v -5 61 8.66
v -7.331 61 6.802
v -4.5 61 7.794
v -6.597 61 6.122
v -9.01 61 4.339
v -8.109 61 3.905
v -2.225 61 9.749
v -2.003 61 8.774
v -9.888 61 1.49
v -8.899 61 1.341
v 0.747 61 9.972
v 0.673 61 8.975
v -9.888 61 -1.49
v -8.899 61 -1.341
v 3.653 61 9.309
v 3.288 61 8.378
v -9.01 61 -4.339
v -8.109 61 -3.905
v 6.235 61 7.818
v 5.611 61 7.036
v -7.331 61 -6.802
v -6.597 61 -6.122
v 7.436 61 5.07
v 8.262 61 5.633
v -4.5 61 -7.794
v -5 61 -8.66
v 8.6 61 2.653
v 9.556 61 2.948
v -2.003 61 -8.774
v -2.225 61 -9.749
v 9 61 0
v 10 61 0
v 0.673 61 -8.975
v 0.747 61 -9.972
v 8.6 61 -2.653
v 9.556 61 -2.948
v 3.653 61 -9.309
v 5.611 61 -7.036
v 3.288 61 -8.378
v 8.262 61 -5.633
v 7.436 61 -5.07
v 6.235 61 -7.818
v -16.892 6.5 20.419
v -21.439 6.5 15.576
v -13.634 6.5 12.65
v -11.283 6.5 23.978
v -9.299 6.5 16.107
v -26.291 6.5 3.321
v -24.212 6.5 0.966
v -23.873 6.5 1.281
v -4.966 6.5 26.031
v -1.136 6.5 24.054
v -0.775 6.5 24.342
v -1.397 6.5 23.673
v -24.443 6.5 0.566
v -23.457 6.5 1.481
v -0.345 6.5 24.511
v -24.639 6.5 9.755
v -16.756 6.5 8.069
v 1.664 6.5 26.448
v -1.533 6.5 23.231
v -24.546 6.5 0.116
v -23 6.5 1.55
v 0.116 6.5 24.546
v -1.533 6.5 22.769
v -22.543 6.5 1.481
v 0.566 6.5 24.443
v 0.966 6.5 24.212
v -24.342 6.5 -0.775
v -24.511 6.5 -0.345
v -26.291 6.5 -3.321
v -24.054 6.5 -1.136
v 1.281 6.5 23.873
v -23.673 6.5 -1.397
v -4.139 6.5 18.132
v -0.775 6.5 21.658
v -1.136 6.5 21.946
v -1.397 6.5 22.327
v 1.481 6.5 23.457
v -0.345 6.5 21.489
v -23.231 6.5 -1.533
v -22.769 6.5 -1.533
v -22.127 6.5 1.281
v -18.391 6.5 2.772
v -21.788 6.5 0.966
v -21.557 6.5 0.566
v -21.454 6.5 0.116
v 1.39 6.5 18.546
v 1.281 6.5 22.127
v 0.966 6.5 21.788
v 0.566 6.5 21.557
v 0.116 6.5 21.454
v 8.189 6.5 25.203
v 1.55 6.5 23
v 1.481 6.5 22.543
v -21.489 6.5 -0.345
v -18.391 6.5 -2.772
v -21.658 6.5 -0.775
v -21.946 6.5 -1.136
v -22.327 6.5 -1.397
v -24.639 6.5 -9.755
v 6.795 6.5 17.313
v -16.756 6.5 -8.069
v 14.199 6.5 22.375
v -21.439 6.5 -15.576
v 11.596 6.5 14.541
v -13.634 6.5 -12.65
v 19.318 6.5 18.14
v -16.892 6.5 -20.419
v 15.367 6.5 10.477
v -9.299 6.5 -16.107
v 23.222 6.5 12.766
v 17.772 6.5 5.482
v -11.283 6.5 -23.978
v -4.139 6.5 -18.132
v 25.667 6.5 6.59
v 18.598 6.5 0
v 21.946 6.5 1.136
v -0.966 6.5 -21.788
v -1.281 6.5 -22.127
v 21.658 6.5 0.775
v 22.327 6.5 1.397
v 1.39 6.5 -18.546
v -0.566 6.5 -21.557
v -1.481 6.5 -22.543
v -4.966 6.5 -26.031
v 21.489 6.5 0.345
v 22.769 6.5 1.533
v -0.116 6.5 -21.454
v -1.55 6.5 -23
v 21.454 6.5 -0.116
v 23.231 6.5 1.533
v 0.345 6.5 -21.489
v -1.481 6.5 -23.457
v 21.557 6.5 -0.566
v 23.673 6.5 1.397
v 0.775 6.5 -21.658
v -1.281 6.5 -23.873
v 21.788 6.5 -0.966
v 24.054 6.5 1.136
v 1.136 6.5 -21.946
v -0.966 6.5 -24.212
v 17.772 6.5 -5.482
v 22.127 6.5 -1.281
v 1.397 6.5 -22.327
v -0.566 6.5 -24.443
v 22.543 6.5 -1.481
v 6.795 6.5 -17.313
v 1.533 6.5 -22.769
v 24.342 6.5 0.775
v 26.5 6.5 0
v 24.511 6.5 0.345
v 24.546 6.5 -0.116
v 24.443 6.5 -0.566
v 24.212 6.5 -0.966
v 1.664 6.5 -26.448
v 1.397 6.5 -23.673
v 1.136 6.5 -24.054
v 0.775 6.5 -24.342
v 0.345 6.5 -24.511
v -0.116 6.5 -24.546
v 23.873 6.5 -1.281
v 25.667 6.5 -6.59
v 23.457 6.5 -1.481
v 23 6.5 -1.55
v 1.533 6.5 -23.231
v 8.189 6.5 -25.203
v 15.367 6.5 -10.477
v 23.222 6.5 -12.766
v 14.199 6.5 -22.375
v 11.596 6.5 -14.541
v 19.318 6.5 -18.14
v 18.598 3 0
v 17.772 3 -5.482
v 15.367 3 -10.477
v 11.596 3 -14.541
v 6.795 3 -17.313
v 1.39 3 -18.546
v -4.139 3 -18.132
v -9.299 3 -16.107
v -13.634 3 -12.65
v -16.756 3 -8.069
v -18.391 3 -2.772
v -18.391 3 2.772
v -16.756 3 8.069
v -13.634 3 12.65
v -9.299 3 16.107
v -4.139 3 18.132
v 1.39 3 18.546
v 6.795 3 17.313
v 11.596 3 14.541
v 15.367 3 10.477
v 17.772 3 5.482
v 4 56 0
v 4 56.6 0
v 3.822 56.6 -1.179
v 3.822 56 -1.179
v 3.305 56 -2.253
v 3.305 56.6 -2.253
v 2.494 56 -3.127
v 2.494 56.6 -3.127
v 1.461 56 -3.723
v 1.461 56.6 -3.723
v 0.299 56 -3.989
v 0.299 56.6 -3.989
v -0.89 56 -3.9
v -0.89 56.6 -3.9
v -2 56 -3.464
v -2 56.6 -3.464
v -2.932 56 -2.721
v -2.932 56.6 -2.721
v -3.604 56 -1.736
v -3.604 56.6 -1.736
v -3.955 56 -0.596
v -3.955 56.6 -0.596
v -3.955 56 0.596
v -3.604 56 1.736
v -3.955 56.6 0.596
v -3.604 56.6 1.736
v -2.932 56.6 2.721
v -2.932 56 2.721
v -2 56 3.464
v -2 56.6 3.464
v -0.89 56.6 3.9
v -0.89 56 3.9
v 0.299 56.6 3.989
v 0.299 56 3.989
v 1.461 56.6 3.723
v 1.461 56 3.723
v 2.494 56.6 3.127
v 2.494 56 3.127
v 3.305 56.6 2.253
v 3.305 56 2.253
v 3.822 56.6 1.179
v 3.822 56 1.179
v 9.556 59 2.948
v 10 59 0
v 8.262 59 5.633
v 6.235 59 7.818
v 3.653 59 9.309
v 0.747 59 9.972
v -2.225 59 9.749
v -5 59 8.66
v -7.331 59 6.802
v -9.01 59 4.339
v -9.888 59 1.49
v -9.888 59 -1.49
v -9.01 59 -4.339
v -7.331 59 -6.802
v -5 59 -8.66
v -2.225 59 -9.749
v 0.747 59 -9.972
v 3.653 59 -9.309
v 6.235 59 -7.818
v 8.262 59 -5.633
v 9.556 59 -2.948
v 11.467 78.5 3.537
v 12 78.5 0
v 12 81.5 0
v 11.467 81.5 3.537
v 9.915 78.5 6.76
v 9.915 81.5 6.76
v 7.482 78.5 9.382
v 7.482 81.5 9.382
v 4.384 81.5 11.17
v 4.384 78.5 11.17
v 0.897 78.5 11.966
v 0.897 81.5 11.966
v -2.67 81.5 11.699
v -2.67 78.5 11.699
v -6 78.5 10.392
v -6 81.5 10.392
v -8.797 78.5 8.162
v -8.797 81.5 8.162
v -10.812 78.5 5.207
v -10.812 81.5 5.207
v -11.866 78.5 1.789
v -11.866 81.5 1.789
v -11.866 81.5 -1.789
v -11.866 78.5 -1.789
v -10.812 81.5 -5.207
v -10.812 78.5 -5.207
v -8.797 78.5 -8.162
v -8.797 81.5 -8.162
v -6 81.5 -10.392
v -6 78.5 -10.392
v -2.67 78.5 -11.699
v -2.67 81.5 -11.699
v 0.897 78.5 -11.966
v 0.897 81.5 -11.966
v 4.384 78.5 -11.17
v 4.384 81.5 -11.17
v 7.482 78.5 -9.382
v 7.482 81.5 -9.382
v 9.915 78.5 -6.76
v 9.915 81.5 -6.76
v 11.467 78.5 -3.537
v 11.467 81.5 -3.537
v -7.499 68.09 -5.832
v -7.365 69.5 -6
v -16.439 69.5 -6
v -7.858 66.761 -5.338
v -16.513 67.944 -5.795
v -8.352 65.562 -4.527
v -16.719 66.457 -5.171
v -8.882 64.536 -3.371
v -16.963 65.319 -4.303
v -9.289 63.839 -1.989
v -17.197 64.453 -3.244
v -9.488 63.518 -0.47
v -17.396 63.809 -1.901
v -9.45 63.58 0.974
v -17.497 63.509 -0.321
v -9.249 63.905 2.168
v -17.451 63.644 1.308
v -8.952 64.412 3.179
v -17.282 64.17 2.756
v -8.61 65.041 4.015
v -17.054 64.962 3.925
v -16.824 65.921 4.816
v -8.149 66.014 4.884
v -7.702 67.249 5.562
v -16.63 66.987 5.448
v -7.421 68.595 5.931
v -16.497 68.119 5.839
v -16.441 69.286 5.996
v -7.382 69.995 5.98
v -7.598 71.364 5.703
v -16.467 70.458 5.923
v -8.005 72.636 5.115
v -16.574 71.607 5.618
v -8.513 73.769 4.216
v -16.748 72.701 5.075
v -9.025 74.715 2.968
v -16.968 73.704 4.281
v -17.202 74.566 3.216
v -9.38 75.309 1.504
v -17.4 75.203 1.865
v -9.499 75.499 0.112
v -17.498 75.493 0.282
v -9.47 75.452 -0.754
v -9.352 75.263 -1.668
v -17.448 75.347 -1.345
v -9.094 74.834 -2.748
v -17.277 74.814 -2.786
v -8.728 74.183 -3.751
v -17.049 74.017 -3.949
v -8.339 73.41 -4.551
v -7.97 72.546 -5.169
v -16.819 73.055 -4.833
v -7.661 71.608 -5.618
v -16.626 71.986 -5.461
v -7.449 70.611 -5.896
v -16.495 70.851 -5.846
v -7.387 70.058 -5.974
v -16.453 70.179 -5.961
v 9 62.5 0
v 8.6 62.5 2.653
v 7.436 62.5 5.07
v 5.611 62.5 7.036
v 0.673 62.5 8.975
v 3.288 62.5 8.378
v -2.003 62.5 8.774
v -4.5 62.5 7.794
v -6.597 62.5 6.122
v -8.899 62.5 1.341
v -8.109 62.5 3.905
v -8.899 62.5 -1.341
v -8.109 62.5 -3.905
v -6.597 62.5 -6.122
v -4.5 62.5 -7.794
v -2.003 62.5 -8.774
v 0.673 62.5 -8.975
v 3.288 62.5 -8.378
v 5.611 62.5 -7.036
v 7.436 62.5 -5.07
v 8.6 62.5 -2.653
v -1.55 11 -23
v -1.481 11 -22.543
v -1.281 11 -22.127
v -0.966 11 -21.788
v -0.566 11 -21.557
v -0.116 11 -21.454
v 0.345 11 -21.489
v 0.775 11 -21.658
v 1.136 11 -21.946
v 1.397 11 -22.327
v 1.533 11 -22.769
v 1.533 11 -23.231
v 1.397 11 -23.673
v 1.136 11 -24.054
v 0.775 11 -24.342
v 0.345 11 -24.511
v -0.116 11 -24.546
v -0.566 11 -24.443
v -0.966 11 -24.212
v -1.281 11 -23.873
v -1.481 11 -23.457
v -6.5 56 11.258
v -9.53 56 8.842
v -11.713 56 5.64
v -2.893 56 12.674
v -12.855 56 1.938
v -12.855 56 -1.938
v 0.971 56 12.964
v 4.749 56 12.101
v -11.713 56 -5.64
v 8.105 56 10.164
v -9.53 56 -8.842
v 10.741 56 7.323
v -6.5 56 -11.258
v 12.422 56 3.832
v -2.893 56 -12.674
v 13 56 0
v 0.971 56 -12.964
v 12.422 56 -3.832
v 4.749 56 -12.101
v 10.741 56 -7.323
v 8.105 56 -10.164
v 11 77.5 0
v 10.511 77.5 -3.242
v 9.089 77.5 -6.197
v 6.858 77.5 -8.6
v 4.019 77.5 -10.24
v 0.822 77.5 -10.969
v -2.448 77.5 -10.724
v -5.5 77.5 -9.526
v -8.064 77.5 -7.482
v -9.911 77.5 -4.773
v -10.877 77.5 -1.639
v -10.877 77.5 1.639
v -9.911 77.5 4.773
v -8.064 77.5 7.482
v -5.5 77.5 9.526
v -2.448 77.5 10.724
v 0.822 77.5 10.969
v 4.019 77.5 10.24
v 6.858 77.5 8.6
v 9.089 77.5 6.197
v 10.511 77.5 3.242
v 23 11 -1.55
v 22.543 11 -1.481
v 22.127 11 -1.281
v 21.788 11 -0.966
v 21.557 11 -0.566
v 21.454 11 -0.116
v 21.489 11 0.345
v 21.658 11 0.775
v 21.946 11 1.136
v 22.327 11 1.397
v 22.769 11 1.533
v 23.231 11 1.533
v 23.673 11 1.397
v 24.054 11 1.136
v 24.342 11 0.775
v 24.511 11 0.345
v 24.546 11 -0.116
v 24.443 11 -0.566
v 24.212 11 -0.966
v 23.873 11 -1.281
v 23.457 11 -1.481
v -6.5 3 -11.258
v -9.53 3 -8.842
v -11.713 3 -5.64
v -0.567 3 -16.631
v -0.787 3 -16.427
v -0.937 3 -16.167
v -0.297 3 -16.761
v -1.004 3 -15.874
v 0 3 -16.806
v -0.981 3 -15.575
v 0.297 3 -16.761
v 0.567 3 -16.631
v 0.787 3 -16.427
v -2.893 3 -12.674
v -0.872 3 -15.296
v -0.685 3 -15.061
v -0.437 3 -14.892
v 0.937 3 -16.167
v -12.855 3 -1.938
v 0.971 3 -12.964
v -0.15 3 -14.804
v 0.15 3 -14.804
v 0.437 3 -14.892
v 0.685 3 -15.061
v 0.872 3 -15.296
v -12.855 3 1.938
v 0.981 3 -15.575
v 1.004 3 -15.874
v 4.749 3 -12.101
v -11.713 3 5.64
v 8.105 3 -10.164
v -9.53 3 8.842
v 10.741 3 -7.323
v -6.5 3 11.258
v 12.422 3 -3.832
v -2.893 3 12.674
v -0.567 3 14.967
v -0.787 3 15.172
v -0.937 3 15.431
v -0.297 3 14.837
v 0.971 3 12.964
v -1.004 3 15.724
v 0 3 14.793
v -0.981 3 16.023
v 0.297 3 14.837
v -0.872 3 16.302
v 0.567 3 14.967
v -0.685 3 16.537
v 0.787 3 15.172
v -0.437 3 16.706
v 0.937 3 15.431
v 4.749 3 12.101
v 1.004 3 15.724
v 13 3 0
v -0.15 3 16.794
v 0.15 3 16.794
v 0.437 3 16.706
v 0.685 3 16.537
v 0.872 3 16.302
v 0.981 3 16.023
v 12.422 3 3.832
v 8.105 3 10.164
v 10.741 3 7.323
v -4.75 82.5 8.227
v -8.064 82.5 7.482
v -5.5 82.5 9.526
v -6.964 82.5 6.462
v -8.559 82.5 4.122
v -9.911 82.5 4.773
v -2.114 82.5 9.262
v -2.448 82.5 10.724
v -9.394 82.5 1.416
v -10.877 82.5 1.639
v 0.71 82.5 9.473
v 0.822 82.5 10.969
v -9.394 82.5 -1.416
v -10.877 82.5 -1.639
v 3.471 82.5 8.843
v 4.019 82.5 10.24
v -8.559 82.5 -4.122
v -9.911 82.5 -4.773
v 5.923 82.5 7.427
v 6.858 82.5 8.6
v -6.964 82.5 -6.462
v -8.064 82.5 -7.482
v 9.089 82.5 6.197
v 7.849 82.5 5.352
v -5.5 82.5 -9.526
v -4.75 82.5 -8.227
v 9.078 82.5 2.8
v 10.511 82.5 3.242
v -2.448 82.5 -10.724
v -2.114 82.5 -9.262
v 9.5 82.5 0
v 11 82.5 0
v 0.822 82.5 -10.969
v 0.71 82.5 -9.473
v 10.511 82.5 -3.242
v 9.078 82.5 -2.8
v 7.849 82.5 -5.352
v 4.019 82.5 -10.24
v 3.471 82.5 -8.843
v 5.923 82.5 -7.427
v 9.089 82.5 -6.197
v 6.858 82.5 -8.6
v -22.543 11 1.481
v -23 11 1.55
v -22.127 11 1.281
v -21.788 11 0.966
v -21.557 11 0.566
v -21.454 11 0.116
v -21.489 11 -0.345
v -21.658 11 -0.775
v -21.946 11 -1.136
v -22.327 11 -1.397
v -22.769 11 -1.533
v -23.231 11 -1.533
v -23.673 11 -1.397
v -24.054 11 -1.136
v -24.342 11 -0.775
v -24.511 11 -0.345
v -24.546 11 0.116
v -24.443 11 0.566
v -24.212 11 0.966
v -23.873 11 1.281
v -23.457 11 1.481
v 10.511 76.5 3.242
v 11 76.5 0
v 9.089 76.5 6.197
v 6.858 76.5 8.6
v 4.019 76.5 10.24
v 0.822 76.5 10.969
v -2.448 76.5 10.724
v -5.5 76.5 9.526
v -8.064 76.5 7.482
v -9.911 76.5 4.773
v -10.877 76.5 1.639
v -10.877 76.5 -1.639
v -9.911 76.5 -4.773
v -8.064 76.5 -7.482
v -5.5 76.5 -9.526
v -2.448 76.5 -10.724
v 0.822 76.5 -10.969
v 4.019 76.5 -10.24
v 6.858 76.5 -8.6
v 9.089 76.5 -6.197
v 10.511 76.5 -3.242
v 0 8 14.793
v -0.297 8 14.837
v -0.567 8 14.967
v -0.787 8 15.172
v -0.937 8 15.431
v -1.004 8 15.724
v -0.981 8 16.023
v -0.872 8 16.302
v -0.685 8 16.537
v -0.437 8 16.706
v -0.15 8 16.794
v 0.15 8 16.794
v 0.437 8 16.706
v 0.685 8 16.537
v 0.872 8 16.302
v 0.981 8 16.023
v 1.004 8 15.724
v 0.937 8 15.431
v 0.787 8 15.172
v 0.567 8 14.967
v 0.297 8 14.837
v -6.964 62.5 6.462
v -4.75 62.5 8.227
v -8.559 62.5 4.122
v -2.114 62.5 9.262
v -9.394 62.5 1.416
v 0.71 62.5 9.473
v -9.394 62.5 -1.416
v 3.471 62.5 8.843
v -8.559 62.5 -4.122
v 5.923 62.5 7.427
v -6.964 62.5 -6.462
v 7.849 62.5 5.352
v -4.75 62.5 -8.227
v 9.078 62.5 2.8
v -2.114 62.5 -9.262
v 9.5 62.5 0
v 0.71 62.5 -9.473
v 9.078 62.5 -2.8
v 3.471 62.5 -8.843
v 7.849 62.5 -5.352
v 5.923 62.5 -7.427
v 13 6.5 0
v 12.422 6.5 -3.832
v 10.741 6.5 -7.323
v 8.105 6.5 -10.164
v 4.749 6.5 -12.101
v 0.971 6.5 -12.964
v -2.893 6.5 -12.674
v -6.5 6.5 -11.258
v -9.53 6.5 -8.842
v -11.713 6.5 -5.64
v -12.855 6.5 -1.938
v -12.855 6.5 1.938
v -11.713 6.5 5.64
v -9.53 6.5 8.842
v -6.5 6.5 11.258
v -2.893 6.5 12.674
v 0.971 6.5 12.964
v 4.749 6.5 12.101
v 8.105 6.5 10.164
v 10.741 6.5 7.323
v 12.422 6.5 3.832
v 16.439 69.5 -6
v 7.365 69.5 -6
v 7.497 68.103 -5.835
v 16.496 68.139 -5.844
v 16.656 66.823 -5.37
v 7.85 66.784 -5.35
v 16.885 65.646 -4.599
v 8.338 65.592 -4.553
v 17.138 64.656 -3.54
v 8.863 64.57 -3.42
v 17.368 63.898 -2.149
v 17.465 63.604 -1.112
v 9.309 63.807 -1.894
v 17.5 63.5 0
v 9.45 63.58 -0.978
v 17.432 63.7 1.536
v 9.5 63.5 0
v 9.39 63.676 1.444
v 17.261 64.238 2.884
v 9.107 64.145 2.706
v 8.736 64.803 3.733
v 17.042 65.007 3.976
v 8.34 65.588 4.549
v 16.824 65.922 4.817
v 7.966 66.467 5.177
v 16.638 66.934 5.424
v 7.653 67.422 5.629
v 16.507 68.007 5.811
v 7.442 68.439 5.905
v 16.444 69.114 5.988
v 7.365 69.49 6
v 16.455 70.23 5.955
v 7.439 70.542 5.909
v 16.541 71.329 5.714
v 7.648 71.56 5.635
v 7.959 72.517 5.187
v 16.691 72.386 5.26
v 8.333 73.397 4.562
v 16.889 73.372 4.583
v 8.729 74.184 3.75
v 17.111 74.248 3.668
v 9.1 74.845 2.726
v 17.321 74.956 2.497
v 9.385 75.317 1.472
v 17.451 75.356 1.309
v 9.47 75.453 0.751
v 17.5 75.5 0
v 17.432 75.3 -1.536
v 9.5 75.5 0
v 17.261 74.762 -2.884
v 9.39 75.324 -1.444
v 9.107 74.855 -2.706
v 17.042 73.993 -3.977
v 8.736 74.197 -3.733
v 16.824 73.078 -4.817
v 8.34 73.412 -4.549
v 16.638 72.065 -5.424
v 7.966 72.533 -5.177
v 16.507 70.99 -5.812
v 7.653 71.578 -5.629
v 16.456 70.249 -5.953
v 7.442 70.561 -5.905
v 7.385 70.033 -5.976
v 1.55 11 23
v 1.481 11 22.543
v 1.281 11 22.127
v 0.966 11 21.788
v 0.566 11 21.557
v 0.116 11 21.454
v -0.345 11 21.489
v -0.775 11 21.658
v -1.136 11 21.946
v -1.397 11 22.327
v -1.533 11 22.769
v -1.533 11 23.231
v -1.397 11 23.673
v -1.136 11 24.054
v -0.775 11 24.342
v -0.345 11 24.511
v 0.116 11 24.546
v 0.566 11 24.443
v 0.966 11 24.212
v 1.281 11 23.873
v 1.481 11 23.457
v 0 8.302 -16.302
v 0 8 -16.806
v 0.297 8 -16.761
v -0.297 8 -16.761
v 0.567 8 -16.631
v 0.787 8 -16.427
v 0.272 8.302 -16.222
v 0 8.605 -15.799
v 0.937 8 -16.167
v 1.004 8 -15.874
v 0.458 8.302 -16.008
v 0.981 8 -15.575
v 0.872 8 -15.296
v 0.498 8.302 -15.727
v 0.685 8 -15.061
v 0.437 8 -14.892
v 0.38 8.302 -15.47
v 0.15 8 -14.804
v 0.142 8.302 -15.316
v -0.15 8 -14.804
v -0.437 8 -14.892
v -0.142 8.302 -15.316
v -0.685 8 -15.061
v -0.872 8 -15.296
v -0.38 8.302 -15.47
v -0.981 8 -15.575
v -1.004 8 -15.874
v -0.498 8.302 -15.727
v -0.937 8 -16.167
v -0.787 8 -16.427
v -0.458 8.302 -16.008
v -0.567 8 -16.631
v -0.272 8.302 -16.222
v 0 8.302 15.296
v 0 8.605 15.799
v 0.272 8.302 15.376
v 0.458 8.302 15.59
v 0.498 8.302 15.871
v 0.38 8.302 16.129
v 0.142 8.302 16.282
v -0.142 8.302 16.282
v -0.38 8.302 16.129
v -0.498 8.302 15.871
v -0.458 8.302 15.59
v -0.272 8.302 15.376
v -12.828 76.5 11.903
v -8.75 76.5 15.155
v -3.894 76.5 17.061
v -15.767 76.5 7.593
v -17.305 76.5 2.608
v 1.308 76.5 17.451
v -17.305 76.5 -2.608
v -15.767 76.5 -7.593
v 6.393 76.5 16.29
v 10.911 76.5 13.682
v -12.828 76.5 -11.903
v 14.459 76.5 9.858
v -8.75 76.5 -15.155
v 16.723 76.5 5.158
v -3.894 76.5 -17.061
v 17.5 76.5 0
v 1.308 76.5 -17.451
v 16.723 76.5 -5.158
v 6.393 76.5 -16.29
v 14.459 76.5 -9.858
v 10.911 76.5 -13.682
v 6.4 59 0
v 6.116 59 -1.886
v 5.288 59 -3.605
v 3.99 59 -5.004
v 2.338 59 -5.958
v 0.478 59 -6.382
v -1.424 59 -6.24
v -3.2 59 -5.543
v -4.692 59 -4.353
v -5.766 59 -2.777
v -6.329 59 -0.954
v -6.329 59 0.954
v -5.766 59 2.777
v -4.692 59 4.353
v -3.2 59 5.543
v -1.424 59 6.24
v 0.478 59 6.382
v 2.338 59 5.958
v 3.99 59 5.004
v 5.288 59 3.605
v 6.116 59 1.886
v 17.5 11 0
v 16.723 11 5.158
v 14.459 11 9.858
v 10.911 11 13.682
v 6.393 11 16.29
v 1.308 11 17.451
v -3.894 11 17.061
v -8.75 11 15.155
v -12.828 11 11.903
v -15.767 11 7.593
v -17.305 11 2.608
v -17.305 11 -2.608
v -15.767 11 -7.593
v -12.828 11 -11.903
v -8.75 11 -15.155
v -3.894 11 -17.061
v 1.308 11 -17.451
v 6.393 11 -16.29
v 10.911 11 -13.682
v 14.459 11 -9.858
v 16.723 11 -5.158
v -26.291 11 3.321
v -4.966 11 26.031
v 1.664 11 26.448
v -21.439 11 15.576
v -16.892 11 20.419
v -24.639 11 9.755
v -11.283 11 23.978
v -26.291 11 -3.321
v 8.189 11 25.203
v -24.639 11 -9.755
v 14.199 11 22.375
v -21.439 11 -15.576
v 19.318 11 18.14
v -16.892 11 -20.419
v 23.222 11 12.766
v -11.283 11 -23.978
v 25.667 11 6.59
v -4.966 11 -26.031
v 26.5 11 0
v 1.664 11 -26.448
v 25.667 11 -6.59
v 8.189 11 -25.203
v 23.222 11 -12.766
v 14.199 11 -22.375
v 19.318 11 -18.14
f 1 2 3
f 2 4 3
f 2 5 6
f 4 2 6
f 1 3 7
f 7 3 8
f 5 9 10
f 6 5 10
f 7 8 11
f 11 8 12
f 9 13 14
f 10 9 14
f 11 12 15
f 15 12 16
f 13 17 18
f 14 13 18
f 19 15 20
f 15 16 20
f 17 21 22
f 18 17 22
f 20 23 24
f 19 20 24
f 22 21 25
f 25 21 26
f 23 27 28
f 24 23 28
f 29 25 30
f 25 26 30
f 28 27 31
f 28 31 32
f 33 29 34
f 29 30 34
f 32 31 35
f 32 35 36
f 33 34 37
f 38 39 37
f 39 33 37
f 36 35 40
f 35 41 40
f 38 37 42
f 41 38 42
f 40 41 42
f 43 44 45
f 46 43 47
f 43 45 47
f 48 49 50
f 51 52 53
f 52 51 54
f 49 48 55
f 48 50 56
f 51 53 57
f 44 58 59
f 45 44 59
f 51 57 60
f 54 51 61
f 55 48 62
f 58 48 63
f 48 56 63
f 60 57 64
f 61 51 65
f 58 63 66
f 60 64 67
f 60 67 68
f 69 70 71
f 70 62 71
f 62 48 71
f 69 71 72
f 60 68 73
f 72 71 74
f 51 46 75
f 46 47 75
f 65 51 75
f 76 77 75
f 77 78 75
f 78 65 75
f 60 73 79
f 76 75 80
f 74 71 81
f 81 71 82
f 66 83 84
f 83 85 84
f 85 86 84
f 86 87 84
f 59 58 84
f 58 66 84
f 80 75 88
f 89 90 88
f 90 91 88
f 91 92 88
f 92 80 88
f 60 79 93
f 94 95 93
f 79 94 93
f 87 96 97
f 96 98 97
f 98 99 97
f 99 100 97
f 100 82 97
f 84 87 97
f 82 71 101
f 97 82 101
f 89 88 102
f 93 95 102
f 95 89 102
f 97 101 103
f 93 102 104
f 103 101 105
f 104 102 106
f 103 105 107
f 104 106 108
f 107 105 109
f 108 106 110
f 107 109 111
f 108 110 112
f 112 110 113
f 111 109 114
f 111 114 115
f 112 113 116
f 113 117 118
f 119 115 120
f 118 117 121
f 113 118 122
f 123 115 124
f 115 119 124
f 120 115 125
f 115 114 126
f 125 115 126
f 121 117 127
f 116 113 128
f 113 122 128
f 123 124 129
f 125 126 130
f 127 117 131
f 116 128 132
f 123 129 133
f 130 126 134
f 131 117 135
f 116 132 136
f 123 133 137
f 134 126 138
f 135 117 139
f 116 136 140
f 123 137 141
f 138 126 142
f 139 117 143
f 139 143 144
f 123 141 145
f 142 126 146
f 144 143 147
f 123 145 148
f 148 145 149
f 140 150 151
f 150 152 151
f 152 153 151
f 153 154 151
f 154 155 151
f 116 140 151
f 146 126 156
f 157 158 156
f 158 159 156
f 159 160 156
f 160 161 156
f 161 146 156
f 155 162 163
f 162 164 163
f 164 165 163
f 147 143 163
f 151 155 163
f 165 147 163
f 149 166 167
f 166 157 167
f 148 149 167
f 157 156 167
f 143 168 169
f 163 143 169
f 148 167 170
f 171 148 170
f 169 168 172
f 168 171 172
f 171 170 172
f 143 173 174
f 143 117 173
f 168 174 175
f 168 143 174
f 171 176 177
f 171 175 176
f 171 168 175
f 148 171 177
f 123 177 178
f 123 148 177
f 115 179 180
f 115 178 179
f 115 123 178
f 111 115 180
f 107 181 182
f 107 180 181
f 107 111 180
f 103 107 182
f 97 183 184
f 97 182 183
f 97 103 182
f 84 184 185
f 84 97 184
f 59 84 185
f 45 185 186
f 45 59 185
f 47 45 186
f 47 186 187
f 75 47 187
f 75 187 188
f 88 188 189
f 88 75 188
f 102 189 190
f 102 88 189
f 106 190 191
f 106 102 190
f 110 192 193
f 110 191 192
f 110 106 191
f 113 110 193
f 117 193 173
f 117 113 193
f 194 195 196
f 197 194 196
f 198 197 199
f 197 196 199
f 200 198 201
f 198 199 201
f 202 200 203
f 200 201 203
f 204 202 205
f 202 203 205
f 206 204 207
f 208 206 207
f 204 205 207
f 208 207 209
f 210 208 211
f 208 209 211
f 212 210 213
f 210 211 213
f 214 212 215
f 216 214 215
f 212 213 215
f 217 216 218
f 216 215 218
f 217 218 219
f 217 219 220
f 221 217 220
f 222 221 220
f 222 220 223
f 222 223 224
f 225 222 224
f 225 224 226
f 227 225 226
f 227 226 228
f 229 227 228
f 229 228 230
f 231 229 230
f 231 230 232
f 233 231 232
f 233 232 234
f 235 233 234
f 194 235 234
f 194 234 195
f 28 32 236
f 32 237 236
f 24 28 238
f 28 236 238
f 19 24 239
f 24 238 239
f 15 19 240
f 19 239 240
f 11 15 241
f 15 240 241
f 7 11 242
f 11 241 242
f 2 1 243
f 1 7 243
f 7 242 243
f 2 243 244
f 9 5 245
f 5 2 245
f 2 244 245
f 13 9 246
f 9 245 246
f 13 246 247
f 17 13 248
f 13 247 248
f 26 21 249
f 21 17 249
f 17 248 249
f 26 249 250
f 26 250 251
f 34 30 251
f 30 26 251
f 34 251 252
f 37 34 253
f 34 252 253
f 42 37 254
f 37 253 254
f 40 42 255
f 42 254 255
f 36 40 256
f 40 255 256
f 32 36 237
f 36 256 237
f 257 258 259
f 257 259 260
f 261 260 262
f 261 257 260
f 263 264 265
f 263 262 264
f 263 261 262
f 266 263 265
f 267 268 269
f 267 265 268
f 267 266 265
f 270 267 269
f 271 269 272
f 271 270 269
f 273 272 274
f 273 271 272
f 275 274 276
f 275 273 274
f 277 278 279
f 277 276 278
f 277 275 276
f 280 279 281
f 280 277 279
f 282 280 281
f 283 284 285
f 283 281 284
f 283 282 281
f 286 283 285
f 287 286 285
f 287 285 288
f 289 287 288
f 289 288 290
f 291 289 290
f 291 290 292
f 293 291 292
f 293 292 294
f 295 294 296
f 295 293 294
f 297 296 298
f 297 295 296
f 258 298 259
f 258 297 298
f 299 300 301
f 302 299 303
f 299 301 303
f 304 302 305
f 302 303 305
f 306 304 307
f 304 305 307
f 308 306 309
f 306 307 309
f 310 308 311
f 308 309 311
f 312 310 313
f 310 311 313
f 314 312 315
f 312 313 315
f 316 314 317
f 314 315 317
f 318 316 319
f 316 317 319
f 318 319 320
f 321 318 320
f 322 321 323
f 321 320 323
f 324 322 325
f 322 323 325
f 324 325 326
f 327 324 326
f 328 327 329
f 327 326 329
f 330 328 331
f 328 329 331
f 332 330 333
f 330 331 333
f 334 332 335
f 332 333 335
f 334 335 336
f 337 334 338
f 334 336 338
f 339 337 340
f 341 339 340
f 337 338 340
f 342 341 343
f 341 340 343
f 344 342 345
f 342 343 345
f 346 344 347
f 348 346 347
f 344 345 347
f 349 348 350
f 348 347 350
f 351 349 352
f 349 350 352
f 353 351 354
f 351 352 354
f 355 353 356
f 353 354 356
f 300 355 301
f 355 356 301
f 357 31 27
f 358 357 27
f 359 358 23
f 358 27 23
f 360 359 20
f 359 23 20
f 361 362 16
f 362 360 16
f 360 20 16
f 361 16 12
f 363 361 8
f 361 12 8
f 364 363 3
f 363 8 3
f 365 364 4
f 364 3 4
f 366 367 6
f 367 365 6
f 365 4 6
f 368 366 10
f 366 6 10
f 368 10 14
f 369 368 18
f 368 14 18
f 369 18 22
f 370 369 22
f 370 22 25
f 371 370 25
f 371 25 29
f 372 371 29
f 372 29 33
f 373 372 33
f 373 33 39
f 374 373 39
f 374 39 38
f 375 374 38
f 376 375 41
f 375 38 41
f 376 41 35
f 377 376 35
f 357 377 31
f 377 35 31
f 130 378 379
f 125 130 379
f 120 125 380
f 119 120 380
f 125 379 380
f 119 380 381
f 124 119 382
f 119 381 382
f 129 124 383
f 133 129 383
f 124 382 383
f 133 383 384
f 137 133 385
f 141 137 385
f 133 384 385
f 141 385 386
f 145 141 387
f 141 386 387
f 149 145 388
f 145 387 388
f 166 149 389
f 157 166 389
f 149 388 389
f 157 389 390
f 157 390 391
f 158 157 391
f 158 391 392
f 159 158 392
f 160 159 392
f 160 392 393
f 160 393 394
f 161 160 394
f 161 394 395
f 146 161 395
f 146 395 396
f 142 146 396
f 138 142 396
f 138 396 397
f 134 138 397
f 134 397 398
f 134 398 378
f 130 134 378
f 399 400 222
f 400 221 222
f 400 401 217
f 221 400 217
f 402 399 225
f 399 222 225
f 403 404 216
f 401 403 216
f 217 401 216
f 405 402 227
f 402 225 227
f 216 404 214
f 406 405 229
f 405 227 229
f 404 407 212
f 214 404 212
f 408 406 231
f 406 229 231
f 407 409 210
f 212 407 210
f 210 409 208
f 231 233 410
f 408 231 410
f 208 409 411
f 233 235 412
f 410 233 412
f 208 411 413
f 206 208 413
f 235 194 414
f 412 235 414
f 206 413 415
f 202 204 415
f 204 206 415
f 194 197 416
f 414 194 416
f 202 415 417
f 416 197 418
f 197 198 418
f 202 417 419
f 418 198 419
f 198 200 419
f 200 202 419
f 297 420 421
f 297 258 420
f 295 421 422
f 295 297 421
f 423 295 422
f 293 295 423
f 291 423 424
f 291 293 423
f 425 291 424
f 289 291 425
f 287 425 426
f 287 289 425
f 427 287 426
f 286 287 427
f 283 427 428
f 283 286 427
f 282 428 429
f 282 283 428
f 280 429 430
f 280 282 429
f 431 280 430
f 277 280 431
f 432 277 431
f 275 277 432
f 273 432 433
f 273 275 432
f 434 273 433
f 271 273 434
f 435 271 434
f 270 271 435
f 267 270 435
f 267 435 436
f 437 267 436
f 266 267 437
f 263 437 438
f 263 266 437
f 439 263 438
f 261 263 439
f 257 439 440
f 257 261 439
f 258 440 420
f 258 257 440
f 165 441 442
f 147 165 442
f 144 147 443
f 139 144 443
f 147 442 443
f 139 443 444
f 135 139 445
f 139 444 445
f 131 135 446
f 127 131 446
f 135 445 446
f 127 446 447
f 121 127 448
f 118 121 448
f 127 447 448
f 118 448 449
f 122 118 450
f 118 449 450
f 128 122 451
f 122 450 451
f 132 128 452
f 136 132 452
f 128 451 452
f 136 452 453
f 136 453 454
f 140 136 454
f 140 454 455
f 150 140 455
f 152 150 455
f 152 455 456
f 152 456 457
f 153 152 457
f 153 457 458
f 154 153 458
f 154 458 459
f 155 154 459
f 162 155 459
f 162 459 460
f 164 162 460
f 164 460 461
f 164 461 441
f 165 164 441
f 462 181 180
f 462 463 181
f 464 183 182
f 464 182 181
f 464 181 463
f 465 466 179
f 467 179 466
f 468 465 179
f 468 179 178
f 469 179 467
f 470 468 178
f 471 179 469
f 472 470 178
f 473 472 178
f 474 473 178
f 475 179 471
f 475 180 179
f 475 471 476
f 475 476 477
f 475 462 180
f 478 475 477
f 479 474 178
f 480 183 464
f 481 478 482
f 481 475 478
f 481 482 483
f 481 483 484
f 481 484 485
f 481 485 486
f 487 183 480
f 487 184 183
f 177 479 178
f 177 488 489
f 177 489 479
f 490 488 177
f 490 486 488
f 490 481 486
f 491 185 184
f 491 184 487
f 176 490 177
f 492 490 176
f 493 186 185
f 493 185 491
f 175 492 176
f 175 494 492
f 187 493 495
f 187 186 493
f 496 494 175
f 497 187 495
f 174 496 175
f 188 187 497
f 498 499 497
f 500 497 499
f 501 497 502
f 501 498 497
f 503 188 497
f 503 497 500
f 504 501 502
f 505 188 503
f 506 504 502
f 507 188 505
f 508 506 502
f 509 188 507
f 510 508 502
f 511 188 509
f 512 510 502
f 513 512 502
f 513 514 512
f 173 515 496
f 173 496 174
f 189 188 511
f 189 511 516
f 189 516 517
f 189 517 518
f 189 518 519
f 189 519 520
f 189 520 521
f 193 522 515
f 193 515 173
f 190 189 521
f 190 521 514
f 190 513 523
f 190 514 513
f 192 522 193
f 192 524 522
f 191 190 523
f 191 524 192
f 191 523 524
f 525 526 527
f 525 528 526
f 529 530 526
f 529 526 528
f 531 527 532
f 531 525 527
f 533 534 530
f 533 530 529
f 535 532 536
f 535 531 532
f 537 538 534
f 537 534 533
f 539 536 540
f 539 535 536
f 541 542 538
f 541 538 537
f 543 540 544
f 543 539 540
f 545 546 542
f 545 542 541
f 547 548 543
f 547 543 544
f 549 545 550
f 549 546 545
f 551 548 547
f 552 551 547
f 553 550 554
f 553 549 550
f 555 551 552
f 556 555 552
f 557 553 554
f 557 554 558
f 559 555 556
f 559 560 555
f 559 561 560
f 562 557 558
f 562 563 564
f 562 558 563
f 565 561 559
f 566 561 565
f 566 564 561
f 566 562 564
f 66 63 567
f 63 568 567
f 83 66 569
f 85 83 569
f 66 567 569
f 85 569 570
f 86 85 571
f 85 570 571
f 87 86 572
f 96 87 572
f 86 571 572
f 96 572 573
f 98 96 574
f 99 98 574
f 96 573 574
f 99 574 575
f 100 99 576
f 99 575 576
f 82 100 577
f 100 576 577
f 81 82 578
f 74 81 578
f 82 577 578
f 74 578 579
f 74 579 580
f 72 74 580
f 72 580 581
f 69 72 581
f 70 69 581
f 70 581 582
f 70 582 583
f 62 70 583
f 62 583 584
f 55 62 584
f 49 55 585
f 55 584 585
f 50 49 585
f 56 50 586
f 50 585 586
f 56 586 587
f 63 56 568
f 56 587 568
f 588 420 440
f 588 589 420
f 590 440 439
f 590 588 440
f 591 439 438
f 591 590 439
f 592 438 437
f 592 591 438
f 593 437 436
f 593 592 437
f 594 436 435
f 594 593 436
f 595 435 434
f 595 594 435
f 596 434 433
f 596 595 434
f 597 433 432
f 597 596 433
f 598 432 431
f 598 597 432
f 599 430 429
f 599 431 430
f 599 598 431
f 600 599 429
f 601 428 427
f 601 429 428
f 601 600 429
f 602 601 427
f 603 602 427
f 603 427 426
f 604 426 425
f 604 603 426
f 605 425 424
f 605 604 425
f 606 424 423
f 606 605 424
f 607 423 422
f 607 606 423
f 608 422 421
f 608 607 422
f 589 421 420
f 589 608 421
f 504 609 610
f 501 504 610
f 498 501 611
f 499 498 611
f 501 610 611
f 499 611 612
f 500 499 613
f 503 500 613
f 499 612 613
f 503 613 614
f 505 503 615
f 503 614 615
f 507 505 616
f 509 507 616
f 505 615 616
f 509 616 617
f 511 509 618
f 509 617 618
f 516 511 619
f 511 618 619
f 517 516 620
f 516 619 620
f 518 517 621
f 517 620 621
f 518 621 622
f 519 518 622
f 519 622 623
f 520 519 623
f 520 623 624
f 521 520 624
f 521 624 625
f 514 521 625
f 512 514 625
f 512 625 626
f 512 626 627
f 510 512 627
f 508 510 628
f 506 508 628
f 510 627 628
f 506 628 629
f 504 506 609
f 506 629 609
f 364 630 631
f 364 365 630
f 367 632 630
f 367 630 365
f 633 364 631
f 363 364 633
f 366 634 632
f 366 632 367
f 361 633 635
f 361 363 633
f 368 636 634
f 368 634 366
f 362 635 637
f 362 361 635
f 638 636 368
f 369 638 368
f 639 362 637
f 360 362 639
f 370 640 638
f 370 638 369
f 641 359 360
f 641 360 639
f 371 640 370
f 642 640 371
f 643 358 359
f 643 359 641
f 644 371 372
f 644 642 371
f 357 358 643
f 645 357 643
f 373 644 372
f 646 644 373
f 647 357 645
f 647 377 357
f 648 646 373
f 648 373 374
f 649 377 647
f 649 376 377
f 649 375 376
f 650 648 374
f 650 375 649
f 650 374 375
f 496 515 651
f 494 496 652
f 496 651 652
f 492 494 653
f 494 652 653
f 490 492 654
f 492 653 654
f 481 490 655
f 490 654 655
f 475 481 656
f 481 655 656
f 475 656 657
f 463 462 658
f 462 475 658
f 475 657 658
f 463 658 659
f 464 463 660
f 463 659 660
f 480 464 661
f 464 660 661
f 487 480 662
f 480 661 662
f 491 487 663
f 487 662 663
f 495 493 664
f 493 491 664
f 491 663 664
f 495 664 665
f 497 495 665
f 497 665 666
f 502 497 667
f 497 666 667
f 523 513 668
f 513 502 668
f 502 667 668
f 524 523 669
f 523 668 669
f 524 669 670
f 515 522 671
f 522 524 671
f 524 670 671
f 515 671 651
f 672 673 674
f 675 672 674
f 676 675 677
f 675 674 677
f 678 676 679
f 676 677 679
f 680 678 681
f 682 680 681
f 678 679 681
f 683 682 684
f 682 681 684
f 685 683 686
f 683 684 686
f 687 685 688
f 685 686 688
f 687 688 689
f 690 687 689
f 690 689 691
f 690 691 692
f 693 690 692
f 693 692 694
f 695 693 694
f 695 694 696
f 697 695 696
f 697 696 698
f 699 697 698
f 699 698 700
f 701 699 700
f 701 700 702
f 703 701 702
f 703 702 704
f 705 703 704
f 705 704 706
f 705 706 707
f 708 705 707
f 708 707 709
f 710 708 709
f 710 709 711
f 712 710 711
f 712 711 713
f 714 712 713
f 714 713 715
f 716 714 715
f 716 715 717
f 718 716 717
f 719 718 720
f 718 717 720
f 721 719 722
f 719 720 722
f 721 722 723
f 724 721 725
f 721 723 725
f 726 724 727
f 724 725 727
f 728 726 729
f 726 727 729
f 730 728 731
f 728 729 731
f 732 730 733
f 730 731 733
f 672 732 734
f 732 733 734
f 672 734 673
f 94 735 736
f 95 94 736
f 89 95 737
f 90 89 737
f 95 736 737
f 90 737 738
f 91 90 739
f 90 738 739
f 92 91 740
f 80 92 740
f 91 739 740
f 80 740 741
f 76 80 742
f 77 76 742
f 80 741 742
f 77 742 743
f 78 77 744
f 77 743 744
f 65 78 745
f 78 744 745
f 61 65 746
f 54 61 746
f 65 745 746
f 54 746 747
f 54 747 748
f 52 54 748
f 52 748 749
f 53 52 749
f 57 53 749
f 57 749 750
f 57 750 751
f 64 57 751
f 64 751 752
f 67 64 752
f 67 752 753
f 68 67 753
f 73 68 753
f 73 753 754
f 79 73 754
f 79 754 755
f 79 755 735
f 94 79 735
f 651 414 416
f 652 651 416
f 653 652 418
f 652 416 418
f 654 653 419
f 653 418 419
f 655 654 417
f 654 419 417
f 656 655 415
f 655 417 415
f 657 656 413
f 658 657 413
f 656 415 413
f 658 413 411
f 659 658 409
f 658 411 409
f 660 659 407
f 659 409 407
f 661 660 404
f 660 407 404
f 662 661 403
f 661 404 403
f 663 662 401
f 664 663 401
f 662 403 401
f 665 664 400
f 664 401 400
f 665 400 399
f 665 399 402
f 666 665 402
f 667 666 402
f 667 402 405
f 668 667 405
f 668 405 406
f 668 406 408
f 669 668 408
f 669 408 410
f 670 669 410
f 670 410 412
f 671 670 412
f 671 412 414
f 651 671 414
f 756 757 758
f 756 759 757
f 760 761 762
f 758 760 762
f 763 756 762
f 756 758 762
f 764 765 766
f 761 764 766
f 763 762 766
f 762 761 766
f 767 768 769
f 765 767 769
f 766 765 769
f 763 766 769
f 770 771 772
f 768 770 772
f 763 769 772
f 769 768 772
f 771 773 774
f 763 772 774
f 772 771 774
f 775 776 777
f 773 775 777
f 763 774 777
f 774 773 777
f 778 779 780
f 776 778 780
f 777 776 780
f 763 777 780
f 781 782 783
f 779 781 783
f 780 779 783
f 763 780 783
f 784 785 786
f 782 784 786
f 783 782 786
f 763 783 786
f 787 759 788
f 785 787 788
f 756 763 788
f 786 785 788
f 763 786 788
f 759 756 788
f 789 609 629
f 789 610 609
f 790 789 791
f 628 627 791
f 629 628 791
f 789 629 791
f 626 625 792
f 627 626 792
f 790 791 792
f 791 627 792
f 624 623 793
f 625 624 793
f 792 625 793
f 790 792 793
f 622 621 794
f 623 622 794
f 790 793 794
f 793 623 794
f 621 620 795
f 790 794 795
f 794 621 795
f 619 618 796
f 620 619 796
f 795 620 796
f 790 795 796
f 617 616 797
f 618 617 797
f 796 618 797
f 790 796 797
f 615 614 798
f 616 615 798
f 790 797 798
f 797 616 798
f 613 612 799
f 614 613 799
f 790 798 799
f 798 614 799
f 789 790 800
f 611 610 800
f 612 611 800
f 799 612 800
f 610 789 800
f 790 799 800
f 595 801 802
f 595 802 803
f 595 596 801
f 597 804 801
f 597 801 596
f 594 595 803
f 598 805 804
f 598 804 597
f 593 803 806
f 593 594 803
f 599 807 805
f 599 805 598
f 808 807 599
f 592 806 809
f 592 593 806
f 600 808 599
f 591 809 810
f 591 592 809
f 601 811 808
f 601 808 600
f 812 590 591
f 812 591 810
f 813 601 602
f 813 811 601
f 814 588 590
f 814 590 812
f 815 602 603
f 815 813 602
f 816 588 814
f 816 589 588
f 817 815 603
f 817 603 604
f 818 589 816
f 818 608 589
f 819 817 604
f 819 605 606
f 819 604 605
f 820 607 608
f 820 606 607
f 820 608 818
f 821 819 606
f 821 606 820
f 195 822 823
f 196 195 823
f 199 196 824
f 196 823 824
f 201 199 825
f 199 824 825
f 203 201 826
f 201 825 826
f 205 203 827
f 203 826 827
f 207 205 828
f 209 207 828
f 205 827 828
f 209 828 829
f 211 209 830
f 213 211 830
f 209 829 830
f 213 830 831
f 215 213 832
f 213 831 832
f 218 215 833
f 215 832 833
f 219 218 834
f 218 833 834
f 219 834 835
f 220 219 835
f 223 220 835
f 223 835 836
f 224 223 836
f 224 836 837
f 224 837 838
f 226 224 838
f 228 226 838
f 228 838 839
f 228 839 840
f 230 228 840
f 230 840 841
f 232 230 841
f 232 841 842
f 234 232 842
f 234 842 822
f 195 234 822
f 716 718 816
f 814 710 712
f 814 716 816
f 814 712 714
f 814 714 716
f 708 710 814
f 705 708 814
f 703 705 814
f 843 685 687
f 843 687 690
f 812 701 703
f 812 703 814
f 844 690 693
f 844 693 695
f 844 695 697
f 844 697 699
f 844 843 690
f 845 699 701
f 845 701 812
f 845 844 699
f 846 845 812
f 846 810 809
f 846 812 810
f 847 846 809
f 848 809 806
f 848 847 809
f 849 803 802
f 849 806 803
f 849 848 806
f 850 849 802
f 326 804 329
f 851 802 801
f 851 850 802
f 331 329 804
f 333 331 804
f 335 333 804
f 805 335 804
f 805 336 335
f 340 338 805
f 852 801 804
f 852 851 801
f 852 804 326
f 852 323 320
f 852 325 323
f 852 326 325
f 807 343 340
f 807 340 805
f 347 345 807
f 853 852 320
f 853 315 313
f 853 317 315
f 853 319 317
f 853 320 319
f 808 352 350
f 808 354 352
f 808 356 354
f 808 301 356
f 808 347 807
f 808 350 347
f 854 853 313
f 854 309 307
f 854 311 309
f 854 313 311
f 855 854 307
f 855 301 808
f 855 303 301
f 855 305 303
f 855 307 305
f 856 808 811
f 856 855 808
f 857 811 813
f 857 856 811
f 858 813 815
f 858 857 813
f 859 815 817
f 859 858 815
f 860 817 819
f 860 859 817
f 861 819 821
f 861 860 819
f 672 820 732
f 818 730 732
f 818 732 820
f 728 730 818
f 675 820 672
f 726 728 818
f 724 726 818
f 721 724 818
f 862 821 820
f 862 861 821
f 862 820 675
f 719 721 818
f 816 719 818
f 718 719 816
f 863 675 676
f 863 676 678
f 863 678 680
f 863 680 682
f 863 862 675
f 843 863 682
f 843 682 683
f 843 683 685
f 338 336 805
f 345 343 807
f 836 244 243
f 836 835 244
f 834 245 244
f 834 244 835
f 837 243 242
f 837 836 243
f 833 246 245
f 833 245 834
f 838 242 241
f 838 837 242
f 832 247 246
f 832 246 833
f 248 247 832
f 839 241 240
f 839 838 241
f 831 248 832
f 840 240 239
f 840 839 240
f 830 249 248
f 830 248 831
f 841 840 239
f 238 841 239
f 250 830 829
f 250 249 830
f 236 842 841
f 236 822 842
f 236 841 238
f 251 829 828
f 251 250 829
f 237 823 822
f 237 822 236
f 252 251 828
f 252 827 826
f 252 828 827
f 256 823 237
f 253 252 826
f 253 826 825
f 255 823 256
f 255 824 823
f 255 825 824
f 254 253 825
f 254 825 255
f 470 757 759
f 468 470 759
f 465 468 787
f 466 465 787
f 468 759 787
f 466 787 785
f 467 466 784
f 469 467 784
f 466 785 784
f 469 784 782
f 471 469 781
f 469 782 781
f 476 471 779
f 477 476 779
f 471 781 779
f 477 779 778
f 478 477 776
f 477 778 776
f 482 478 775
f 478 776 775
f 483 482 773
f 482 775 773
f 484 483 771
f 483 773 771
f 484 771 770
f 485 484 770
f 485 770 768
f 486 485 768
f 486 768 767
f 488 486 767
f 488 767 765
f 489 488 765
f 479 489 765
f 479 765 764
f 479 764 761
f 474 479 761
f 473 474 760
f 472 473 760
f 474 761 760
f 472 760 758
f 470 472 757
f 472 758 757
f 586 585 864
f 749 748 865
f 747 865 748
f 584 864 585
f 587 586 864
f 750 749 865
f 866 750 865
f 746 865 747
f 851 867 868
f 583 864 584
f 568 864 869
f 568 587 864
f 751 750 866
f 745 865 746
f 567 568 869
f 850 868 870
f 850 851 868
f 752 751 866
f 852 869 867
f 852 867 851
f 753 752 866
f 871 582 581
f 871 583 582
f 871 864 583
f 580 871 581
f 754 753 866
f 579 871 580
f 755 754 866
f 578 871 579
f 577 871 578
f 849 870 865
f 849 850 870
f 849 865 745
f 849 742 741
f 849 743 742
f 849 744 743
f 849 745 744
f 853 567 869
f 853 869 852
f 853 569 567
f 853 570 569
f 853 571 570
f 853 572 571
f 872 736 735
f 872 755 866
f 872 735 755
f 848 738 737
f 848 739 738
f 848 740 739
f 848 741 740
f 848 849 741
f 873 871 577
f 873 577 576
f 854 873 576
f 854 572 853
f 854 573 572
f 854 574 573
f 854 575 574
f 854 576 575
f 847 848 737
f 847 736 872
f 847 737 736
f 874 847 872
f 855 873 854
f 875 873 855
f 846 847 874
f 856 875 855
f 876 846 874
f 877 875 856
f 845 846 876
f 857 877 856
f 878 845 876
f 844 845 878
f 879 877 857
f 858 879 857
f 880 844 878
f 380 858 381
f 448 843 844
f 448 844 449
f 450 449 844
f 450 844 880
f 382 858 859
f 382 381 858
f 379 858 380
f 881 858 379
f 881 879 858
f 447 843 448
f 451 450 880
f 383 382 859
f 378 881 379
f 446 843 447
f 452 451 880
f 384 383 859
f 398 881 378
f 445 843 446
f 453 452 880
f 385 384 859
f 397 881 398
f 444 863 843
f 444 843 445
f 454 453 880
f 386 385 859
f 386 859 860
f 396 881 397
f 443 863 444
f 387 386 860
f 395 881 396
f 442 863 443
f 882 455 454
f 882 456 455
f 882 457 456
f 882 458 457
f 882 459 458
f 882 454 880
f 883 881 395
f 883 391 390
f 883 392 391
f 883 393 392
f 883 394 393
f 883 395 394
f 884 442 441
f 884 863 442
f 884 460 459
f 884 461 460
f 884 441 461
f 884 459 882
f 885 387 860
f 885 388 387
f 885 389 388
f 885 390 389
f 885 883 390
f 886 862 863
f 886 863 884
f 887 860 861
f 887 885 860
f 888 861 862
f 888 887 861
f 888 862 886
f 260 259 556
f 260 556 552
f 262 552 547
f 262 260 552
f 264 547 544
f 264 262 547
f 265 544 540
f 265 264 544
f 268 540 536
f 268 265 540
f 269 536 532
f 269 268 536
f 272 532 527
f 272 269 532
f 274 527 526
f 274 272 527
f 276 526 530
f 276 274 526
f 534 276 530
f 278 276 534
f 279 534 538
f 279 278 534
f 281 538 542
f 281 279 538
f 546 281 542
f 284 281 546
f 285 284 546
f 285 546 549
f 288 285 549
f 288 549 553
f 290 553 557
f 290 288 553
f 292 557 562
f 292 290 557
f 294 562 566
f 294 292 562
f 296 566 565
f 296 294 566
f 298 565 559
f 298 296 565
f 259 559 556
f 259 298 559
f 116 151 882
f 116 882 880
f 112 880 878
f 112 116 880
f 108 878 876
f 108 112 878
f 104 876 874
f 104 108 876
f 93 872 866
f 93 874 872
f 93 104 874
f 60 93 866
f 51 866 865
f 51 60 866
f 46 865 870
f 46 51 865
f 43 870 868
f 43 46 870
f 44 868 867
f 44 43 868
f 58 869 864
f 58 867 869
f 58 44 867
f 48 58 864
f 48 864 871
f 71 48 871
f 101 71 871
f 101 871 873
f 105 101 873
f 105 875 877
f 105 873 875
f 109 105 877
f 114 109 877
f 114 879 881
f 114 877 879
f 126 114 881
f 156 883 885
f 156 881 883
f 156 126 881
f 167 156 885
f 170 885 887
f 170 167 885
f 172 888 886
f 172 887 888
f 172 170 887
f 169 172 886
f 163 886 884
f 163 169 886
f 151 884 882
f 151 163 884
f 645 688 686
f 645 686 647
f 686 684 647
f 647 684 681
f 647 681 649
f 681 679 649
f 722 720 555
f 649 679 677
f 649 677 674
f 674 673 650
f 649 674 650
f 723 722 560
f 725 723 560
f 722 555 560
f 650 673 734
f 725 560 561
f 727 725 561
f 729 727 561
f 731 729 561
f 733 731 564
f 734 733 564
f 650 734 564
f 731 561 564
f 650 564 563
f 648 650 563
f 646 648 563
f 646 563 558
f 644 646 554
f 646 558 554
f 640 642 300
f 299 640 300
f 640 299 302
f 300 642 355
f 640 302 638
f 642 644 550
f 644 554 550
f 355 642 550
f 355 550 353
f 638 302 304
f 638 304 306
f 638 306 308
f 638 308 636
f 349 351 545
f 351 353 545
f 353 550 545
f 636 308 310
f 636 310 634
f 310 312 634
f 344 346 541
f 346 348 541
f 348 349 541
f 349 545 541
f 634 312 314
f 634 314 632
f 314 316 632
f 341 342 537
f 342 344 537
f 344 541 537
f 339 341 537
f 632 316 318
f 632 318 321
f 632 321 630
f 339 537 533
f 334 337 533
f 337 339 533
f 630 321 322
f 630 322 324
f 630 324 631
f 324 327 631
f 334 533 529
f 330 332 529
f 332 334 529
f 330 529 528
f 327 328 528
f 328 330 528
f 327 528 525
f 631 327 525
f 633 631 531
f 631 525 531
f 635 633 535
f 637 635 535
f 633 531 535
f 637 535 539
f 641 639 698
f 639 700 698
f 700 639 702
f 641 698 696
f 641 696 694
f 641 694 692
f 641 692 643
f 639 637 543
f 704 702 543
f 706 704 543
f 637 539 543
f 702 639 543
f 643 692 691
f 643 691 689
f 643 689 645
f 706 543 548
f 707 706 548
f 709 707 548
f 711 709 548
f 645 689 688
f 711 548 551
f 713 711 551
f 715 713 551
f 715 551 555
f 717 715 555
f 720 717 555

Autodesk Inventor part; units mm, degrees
ref_plane "XZ Plane" through (0, 0, 0) normal (0, 1, 0) x (-1, 0, 0)
ref_plane "XY Plane" through (0, 0, 0) normal (0, 0, 1) x (1, 0, 0)
sketch "Sketch1" plane through (0, 0, 0) normal (0, 0, 1) x (1, 0, 0)
  line L0 (0, 0) -> (0, 82.5)
  line L1 (11, 82.5) -> (12, 81.5)
  line L2 (12, 81.5) -> (12, 78.5)
  line L3 (12, 78.5) -> (11, 77.5)
  line L4 (11, 77.5) -> (11, 76.5)
  line L5 (11, 76.5) -> (17.5, 76.5)
  line L6 (17.5, 76.5) -> (17.5, 11)
  line L7 (17.5, 11) -> (26.5, 11)
  line L8 (26.5, 11) -> (26.5, 6.5)
  line L9 (15, 0) -> (13, 0)
  line L10 (13, 0) -> (13, 56)
  line L11 (13, 56) -> (4, 56)
  line L12 (9.5, 62.5) -> (9.5, 82.5)
  line L13 (9.5, 82.5) -> (11, 82.5)
  line L14 (9.5, 62.5) -> (9, 62.5)
  line L15 (9, 62.5) -> (9, 61)
  line L16 (10, 59) -> (6.4, 59)
  line L17 (-4, 47) -> (4, 47)
  line L18 (4, 47) -> (4, 45)
  line L19 (4, 45) -> (-4, 45)
  line L20 (-4, 45) -> (-4, 47)
  line L21 (-4, 47) -> (4, 45) construction
  line L22 (4, 47) -> (-4, 45) construction
  line L23 (9, 61) -> (10, 61)
  line L24 (10, 61) -> (10, 59)
  line L25 (4, 56) -> (4, 56.6)
  line L26 (4, 56.6) -> (6.4, 59)
  circle A0 centre (5, 59) radius 1
  line L27 (26.5, 6.5) -> (13, 6.5)
  point P0 (0, 46)
  dimension "d0" = 26
  dimension "d1" = 35
  dimension "d8" = 56
  dimension "d11" = 24
  dimension "d14" = 135
  dimension "d15" = 22
  dimension "d16" = 22
  dimension "d18" = 3
  dimension "d22" = 19
  dimension "d26" = 135
  dimension "d28" = 6
  dimension "d30" = 18
  dimension "d38" = 8
  dimension "d39" = 2
  dimension "d50" = 14
  dimension "d59" = 20
  dimension "d60" = 2
  dimension "d61" = 3.5
  dimension "d62" = 0.6
  dimension "d63" = 3
  dimension "d64" = 2
  dimension "d65" = 10
  dimension "d66" = 8
  dimension "d67" = 135
  dimension "d68" = 53
  dimension "d69" = 11
  dimension "d70" = 4.5
revolve "Revolution1" add sketch "Sketch1" angle 360 about axis through (0, 0, 0) along (0, 1, 0) picked at (5.7132, 58.309) contours L1 L2 L3 L4 L5 L6 L7 L8 L27 L10 L11 L25 L26 A0 L16 L24 L23 L15 L14 L12 L13 | A0 L26
ref_plane "Work Plane1" through (18.5, 0, 0) normal (1, 0, 0) x (0, 1, 0)
sketch "Sketch2" plane through (18.5, 0, 0) normal (1, 0, 0) x (0, 1, 0)
  line L0 (76.5, 17.5) -> (76.5, -17.5) projected
  point P0 (0, 0)
  point P1 (69.5, 0)
  point P2 (76.5, 0)
  dimension "d41" = 7
hole "Hole1" at (18.5, 69.5, 0) direction (-1, 0, 0) diameter 12 end through all
thread "Thread1" size "M24x1" class "6g" standard "ANSI Metric M Profile" full length
thread "Thread2" size "M18x0.5" class "6H" standard "ANSI Metric M Profile" full length
sketch "Sketch3" plane through (0, 6.5, 0) normal (0, -1, 0) x (1, 0, 0)
  point P0 (0, 0)
  point P1 (23, 0)
  dimension "d71" = 23
hole "Hole2" at (23, 6.5, 0) direction (0, 1, 0) diameter 3.1 end through all clearance for "Countersunk Flat Head Screw DIN EN ISO 2009" size "M2.5" standard "DIN"
pattern_circular "Circular Pattern1" count 4 over 360 about axis through (0, 43.75, 0) along (0, -1, 0) of "Hole2"
sketch "Sketch4" plane through (0, 6.5, 0) normal (0, -1, 0) x (1, 0, 0)
  circle A0 centre (0, 0) radius 13 projected
  circle A1 centre (0, 0) radius 18.5983
extrude "Extrusion1" add sketch "Sketch4" along normal blind 3.5
sketch "Sketch5" plane through (0, 3, 0) normal (0, -1, 0) x (1, 0, 0)
  circle A0 centre (0, 0) radius 18.5983 projected
  circle A1 centre (0, 0) radius 13 projected
  circle A2 centre (0, 0) radius 13 projected
  line L0 (0, 13) -> (0, 18.5983)
  circle A3 centre (0, 0) radius 18.5983 projected
  line L1 (0, -18.5983) -> (0, -13)
  point P0 (0, 0)
  point P1 (0, 15.7991)
  point P2 (0, -15.7991)
hole "Hole3" at (0, 3, 15.7991) at (0, 3, -15.7991) direction (0, 1, 0) diameter 2.013 depth 5 tip angle 118 thread size "M2.5x0.45" class "6H" standard "ISO Metric profile"
equation "\"d14\" = d13"
equation "\"d13\" = 135deg"
properties part number "013" material "Stainless Steel, Austenitic"
